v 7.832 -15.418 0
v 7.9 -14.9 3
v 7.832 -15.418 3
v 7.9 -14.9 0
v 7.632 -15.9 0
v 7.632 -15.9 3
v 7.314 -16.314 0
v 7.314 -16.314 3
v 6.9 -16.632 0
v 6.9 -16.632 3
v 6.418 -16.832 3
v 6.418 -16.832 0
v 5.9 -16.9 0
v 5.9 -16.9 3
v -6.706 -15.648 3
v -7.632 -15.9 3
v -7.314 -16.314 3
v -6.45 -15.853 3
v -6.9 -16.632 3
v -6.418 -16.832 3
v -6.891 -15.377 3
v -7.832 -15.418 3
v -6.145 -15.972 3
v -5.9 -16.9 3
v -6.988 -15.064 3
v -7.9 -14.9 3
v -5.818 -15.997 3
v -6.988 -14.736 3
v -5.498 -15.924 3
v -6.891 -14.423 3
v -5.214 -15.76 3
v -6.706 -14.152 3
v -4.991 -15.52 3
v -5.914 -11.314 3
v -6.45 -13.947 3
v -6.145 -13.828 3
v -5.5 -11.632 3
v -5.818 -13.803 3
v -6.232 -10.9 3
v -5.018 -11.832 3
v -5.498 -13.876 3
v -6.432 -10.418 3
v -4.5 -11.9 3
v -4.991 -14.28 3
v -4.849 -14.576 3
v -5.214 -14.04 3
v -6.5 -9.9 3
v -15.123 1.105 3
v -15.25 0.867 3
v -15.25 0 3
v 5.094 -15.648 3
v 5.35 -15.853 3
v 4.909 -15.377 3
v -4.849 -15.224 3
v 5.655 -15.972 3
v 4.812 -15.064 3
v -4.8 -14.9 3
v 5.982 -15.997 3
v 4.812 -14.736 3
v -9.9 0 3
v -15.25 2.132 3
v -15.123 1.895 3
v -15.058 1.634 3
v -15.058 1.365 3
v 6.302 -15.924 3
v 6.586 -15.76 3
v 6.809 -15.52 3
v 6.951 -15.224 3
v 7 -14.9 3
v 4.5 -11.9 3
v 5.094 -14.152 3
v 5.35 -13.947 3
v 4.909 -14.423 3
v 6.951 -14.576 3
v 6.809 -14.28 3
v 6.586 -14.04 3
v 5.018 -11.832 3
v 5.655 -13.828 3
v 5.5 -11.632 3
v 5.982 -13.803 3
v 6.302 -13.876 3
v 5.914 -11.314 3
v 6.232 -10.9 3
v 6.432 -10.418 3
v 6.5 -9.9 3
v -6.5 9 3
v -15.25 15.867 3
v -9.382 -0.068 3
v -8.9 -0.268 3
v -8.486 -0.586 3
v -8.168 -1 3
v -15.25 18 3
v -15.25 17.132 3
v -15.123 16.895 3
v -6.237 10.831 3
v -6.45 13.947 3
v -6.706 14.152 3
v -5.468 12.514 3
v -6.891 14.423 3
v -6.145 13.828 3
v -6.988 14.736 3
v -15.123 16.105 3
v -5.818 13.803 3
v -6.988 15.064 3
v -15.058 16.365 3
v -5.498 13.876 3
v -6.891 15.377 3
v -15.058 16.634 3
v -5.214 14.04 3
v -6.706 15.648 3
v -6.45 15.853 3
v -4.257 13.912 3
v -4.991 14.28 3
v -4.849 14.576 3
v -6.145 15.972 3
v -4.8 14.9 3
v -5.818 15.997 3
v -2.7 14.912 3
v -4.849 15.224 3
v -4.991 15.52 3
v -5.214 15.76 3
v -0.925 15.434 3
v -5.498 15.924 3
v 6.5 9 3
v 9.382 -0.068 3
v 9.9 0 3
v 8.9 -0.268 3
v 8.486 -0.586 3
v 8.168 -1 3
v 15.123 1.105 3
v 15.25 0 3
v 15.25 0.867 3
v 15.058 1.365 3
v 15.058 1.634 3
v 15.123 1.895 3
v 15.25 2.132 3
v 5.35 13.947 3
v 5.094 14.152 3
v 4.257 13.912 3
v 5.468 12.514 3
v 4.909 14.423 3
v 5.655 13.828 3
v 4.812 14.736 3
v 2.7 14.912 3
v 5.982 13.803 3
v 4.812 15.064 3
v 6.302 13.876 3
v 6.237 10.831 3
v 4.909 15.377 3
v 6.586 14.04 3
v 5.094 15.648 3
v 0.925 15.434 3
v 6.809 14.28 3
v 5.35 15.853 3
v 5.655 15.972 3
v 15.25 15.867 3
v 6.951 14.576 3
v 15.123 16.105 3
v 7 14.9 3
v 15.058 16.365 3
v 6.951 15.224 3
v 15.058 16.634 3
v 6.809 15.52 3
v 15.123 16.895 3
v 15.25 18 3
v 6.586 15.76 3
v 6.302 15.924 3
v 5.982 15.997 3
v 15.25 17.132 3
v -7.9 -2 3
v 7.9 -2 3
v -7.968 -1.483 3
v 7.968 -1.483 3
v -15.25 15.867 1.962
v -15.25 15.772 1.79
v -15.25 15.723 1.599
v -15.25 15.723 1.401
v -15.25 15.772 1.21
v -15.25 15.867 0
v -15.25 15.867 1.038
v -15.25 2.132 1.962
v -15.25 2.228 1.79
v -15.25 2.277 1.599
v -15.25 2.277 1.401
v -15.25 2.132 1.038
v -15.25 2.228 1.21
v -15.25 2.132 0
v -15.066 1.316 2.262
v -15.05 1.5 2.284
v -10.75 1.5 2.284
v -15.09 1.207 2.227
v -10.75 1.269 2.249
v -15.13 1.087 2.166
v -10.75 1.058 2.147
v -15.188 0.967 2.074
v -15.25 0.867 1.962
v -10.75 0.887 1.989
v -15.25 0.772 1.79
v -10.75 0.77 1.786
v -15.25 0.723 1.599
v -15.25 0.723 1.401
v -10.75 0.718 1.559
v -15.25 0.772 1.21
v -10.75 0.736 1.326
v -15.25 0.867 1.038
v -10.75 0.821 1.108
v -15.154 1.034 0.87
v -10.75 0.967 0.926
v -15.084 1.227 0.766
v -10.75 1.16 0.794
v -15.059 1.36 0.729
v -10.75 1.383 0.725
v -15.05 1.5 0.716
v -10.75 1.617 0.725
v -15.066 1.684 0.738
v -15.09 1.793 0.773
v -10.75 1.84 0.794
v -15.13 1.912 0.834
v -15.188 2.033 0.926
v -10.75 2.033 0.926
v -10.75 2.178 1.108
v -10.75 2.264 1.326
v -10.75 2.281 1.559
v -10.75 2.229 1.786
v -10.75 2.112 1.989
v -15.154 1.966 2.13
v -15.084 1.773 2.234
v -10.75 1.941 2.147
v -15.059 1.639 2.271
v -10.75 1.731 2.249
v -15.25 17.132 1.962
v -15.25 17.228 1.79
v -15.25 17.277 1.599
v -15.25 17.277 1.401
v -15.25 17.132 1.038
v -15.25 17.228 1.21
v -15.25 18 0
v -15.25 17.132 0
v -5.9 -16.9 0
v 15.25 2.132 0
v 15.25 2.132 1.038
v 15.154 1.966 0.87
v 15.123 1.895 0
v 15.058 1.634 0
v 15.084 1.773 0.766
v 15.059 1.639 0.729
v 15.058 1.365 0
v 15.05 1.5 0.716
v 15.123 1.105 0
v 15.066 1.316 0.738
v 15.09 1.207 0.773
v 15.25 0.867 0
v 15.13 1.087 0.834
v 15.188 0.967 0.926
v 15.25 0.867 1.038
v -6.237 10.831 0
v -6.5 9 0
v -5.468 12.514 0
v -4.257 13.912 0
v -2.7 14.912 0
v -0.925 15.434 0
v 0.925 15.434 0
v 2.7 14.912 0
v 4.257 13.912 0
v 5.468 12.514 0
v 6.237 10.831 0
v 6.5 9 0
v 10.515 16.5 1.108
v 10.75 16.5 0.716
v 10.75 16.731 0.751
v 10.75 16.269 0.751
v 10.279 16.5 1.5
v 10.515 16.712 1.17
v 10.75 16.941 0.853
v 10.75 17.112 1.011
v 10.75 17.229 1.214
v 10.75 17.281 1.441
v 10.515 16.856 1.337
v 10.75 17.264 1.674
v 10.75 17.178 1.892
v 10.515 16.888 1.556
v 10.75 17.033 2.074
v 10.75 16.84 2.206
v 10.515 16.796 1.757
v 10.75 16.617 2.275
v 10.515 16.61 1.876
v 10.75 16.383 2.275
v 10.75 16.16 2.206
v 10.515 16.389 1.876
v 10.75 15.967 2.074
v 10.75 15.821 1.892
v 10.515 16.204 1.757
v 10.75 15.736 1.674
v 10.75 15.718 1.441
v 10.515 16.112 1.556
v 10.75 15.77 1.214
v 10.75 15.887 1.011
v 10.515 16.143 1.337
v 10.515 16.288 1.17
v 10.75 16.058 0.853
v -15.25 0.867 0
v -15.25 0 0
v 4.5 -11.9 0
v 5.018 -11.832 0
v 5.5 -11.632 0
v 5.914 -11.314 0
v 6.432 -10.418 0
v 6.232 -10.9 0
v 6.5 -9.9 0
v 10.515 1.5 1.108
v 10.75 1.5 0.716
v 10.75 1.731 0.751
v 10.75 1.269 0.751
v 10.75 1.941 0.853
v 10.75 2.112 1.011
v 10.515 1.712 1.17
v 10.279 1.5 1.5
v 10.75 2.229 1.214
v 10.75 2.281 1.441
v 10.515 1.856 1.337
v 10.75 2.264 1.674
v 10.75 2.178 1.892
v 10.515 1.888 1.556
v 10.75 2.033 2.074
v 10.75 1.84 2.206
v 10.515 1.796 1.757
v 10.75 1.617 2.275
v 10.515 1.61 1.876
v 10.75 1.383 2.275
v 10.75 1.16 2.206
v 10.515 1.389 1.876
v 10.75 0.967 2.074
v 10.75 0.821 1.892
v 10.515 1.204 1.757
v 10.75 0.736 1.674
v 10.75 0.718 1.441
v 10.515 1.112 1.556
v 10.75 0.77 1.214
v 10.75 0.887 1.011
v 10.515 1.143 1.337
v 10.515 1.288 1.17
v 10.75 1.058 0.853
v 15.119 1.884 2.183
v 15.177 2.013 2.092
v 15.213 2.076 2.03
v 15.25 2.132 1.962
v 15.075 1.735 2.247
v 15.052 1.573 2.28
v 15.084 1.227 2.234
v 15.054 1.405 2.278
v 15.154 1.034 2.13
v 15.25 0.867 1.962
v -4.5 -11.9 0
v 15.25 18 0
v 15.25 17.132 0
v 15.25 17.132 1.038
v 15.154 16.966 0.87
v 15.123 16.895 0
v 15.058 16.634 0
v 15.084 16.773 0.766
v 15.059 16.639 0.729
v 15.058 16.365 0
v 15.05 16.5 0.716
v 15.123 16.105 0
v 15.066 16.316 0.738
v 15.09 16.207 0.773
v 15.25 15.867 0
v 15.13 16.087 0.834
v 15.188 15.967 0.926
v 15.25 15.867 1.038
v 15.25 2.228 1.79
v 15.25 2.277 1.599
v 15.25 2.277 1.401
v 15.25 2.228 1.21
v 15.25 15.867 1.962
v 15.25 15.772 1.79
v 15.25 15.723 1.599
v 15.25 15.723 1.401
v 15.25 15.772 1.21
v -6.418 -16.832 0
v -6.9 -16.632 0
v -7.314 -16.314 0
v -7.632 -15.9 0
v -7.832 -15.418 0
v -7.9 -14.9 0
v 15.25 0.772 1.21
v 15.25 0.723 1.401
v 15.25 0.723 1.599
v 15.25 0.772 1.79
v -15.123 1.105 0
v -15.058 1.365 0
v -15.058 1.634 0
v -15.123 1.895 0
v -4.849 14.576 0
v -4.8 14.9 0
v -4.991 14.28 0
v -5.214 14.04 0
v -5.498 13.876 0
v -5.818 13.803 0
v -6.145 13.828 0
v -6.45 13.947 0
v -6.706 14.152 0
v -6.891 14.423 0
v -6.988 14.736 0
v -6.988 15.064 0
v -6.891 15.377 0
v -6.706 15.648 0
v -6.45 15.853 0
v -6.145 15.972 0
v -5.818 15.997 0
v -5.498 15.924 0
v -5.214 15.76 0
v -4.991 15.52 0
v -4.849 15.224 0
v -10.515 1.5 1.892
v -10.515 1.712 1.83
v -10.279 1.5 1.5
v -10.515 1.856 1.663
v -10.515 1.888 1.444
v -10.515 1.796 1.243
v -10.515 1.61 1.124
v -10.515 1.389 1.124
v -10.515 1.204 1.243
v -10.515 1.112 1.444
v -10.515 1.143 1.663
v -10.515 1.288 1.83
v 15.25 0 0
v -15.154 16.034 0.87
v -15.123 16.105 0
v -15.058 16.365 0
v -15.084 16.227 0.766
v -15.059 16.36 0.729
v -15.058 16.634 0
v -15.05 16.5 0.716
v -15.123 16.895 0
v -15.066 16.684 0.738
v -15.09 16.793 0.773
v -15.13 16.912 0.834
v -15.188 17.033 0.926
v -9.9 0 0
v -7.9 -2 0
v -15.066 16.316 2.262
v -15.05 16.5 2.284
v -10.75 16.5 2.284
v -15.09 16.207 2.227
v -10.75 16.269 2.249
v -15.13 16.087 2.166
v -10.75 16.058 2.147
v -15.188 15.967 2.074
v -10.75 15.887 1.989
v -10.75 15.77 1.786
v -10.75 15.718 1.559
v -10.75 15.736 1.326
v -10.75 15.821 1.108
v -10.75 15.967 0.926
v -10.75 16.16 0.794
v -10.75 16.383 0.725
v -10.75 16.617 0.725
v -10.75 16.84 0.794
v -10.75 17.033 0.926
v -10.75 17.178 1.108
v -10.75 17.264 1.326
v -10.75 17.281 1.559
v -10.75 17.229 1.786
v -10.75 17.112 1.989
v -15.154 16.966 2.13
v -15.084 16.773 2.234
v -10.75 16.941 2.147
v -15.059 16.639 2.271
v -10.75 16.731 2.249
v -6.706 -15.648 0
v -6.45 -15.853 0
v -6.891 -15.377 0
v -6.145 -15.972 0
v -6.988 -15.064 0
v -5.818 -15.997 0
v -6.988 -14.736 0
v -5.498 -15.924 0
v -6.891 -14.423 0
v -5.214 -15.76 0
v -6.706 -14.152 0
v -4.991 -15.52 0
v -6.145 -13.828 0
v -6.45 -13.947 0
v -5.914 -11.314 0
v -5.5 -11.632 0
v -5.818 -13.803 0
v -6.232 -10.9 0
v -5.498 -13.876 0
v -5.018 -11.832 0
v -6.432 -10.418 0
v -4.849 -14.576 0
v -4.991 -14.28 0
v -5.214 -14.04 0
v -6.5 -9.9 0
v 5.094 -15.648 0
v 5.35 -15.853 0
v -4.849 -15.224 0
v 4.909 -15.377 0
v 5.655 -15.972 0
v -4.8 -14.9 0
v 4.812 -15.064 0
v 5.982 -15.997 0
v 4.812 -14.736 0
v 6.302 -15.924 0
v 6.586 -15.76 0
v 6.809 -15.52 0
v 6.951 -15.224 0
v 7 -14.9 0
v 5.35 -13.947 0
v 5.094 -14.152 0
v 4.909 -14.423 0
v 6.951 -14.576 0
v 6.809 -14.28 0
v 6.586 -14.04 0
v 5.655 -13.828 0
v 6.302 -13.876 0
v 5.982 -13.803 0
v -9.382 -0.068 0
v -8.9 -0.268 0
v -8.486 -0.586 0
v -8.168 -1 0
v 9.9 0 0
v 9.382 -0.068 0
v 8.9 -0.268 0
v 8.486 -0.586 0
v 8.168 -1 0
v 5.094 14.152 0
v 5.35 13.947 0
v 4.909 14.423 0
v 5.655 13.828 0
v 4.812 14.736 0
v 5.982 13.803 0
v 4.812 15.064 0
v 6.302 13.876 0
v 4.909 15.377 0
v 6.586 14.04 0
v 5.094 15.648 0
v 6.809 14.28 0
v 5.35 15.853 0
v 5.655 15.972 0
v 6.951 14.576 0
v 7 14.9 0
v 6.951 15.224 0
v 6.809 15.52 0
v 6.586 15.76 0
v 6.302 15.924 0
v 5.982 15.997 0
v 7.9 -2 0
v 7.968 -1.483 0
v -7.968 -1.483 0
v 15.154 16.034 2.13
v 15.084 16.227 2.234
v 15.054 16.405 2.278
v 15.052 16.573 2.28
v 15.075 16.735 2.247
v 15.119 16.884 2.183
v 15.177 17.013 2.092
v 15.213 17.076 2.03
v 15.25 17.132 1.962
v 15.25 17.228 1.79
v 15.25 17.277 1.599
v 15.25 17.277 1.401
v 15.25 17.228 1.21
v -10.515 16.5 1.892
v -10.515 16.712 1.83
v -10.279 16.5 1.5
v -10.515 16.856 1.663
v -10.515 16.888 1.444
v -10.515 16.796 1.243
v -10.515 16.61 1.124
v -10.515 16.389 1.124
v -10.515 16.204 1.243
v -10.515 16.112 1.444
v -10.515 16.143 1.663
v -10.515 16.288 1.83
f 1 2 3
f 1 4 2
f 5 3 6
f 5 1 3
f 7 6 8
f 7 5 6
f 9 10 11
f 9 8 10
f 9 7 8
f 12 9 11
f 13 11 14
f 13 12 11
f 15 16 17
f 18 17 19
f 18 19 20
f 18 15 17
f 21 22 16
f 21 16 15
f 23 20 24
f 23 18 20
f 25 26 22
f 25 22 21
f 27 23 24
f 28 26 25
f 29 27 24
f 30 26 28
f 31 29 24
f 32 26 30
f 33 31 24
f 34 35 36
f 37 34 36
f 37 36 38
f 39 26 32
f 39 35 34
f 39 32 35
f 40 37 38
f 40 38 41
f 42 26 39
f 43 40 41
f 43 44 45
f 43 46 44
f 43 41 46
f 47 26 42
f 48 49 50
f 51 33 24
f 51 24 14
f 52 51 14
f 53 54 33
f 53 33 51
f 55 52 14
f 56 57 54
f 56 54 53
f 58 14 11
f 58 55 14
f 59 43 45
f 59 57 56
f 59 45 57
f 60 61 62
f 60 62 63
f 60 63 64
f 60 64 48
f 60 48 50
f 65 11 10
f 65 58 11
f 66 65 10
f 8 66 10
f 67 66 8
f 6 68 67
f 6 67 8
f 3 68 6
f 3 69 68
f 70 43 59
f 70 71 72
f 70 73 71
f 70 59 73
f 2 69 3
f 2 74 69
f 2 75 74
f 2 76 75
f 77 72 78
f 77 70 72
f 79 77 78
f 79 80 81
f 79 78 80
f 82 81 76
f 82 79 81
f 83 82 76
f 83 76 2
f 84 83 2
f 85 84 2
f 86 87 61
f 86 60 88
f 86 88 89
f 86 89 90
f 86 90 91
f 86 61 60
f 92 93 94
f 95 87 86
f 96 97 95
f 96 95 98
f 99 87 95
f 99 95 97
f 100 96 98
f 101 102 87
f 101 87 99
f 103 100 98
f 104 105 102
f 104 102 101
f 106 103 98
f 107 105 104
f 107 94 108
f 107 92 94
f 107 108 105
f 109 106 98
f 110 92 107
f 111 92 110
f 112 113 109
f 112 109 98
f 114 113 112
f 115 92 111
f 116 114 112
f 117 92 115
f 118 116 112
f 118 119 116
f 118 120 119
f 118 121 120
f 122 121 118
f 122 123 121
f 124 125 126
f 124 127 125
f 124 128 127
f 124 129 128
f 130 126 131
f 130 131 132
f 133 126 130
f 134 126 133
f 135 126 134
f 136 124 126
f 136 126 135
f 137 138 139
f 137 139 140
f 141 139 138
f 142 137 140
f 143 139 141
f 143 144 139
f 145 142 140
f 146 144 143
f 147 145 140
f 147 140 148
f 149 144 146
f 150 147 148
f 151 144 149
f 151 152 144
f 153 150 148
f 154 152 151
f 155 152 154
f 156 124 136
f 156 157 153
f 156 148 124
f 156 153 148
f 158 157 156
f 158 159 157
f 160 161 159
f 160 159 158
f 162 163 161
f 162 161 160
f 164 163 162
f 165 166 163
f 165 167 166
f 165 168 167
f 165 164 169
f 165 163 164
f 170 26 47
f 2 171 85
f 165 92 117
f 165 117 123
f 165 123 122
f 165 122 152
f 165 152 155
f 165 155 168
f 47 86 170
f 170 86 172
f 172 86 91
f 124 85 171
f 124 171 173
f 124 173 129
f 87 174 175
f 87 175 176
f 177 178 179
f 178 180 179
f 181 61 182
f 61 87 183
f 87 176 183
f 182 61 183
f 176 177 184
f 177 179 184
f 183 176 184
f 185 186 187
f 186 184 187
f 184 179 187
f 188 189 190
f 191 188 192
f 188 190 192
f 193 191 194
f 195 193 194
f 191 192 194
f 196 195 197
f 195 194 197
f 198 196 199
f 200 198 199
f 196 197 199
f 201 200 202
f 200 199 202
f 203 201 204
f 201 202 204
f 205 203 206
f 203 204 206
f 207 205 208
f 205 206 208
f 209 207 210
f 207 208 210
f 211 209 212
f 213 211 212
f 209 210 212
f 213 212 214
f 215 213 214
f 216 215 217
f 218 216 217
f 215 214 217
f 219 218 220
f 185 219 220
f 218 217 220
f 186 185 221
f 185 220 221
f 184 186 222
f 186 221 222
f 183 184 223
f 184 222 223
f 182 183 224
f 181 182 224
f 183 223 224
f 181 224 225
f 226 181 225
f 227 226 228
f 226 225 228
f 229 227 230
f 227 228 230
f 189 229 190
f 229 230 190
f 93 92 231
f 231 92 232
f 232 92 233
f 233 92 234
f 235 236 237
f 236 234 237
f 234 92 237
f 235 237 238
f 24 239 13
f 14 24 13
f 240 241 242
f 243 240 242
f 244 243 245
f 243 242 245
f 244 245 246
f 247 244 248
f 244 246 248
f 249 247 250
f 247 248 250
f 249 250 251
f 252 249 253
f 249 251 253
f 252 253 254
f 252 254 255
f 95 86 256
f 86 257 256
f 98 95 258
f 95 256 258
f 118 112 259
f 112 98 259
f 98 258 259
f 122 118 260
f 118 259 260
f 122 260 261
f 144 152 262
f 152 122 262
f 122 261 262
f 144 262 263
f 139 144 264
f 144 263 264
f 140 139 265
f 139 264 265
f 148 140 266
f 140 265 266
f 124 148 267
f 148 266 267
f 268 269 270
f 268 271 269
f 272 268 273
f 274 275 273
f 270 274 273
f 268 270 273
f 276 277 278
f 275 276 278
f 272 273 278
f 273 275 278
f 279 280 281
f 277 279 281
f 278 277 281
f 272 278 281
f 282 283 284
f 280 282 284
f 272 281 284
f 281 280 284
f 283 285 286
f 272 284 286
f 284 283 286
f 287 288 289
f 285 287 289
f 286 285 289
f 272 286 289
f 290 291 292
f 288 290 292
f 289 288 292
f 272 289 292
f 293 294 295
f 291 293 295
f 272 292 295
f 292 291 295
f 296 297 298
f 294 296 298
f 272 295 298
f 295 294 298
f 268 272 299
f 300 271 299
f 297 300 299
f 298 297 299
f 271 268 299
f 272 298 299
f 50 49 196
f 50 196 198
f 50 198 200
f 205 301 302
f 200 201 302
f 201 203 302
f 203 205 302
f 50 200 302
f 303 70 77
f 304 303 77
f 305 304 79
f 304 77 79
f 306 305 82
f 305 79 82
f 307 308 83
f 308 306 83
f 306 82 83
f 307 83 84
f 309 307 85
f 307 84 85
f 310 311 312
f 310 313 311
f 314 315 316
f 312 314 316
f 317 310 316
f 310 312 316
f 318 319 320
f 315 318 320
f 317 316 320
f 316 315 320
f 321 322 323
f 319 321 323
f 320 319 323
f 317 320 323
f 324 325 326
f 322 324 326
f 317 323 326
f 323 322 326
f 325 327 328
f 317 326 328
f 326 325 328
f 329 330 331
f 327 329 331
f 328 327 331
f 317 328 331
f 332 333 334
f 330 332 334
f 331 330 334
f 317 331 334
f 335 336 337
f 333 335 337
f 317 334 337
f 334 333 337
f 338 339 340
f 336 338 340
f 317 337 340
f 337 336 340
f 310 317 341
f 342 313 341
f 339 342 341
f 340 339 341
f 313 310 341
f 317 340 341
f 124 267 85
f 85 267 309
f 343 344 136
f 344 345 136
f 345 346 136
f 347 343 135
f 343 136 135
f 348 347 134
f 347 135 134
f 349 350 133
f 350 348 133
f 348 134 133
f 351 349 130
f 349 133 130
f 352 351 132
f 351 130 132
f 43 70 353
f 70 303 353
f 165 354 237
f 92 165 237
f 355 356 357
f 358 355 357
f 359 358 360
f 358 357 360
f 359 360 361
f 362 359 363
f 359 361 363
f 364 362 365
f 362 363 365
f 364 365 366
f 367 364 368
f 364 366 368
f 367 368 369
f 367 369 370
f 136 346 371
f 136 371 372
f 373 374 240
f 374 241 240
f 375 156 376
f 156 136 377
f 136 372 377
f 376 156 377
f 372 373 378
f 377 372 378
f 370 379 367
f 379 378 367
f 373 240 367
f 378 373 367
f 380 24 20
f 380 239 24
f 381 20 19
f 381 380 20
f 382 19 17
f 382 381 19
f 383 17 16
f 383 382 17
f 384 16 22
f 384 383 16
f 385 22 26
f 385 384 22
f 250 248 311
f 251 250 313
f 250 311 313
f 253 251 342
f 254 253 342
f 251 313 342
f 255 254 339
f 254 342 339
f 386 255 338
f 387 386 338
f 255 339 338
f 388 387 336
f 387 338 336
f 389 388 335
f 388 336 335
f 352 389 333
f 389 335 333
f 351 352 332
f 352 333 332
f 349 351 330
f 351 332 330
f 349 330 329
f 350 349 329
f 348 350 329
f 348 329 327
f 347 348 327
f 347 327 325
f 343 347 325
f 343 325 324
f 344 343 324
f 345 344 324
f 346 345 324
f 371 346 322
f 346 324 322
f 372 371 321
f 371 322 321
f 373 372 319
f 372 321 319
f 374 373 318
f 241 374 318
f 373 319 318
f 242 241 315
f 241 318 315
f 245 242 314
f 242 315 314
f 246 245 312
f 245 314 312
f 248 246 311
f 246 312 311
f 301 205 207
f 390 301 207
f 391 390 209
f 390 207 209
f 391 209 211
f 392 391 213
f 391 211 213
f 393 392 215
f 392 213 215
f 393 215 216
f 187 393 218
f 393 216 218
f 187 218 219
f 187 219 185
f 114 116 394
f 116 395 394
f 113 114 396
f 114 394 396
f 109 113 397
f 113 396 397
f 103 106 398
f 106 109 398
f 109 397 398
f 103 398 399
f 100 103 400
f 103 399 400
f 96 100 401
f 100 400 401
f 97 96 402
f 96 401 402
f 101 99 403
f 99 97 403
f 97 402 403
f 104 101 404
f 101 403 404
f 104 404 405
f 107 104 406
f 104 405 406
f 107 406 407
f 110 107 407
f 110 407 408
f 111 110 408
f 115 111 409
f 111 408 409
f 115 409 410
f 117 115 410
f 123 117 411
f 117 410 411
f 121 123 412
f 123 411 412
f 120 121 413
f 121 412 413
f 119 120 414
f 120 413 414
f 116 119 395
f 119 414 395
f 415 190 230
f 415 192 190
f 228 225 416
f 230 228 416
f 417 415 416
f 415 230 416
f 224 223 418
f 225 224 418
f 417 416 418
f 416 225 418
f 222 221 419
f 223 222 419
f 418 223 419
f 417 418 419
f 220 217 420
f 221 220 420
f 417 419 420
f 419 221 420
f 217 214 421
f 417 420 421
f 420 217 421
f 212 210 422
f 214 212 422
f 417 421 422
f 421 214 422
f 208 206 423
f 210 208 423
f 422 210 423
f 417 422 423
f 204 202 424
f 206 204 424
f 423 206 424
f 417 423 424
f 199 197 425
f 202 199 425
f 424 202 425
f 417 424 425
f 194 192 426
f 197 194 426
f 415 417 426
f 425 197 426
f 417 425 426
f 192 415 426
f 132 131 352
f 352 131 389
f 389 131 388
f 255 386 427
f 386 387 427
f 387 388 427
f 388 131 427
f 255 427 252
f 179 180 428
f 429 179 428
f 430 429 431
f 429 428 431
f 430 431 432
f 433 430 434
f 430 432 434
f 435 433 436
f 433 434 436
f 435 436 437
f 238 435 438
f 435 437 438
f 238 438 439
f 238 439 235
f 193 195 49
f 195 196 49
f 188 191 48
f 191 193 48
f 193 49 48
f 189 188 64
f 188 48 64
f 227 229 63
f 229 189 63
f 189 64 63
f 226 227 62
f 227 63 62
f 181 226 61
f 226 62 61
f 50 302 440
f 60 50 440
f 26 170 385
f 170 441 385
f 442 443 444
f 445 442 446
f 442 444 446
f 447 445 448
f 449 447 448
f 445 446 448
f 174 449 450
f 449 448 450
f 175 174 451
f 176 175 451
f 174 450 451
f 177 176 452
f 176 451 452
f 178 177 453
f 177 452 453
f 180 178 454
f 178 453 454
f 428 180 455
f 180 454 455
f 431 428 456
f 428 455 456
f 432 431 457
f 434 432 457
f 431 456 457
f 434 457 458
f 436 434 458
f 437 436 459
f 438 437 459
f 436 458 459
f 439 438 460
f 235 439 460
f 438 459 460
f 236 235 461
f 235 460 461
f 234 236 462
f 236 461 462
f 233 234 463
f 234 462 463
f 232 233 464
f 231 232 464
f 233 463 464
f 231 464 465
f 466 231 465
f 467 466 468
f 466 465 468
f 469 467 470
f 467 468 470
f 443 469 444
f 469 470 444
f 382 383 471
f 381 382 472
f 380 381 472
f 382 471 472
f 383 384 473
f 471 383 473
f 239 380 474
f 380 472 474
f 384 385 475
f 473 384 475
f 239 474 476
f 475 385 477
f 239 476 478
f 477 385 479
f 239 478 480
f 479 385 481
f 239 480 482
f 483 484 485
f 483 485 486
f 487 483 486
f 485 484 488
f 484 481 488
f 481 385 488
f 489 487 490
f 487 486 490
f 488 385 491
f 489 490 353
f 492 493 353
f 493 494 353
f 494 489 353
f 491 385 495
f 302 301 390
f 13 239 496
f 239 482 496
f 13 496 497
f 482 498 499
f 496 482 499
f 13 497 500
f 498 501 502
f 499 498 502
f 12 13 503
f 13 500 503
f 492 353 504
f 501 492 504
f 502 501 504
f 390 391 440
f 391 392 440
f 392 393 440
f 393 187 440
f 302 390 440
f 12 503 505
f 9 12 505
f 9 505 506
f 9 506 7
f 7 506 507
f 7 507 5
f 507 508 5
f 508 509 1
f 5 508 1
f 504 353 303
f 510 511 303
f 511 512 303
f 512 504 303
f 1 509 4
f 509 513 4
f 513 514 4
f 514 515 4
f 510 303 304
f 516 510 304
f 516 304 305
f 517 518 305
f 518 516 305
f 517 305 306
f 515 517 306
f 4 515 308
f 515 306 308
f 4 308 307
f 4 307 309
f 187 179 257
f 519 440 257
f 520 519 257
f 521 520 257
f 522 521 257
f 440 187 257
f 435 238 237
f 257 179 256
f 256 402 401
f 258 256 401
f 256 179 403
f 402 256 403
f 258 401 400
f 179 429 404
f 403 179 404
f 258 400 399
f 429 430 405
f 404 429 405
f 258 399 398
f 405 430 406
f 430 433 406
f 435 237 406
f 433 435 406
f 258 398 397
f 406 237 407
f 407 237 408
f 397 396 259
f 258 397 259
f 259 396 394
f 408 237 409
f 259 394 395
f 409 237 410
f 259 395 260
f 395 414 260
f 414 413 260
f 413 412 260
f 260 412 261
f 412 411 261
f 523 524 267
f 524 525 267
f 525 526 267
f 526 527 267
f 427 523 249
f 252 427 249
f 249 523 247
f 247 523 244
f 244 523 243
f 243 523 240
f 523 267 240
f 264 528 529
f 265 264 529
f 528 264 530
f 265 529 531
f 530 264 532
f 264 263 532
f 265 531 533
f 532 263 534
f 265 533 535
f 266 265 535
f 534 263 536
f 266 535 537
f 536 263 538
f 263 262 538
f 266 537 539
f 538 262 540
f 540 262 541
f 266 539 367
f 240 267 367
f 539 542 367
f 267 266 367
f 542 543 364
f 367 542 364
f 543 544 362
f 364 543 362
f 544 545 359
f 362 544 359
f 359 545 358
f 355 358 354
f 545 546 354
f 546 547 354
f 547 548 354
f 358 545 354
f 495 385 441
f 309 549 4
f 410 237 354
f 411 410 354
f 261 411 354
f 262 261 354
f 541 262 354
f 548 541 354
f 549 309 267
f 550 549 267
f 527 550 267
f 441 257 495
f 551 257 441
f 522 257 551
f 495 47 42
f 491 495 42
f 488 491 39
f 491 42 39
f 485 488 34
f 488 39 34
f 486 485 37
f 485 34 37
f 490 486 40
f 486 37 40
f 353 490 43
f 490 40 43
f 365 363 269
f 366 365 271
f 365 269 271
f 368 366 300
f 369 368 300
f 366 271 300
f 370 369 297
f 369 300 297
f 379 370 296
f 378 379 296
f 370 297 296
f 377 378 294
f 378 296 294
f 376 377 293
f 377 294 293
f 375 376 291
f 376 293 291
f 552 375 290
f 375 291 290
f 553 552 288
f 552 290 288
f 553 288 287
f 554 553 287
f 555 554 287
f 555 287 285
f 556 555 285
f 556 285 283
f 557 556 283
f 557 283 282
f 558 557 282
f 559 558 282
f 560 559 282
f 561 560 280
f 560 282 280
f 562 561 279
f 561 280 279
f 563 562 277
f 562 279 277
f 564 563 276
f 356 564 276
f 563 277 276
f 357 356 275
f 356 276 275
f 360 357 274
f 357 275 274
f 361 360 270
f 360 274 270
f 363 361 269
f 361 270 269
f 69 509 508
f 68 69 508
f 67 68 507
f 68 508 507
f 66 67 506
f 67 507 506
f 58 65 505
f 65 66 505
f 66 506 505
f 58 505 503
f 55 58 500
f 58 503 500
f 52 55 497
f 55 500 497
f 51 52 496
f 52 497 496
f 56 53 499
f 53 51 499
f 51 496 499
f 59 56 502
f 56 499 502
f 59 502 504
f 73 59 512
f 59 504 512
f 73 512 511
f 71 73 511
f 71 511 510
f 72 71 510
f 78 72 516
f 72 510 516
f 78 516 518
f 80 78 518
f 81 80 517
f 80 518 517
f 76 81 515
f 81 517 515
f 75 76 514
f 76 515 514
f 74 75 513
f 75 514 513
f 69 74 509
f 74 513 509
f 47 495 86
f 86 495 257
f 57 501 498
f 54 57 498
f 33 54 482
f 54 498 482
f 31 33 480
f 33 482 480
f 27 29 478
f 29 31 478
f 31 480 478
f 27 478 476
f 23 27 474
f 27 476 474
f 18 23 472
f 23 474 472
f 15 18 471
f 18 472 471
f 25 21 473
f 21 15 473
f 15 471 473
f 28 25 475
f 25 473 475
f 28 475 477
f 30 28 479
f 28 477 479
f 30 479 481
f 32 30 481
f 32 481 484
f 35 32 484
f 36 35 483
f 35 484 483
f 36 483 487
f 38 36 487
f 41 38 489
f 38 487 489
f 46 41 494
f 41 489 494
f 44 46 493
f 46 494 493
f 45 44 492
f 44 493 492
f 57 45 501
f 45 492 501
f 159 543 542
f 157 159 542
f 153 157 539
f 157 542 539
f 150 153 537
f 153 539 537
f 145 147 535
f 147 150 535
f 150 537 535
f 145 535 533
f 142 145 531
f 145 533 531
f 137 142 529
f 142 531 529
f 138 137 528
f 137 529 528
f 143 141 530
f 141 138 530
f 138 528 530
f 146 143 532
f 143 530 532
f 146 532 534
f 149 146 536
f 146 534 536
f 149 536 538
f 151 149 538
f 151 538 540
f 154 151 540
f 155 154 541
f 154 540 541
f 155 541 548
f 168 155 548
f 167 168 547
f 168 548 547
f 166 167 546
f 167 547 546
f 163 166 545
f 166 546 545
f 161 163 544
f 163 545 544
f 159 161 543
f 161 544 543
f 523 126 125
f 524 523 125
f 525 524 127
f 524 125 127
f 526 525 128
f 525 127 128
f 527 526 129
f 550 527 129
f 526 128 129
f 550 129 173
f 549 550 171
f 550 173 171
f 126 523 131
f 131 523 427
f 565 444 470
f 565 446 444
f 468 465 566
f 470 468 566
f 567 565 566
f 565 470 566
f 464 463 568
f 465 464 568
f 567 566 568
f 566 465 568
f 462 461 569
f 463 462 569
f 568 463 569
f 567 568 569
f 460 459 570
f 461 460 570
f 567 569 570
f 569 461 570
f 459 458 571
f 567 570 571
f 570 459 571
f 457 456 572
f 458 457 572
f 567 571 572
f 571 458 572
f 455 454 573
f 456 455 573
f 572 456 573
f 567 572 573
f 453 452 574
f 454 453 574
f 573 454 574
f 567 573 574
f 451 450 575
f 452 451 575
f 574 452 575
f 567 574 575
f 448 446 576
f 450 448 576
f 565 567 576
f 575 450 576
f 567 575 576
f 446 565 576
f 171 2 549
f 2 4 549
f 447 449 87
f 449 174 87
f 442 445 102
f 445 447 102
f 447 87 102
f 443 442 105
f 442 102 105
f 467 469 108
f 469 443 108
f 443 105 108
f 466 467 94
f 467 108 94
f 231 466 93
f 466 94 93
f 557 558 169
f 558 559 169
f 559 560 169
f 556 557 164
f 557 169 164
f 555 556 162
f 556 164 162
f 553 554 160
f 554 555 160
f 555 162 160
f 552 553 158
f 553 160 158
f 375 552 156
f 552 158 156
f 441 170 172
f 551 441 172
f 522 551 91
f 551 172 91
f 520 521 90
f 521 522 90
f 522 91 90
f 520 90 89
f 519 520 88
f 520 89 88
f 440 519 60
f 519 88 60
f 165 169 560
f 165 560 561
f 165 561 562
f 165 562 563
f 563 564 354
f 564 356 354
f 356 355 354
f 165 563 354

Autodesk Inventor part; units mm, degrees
ref_plane "YZ Plane" through (0, 0, 0) normal (1, 0, 0) x (0, 1, 0)
ref_plane "XZ Plane" through (0, 0, 0) normal (0, 1, 0) x (-1, 0, 0)
ref_plane "XY Plane" through (0, 0, 0) normal (0, 0, 1) x (1, 0, 0)
sketch "スケッチ1" plane through (0, 0, 0) normal (0, 0, 1) x (1, 0, 0)
  line L0 (-5.9, -14.9) -> (5.9, -14.9) construction
  line L1 (5.9, -14.9) -> (5.9, 14.9) construction
  line L2 (5.9, 14.9) -> (-5.9, 14.9) construction
  line L3 (-5.9, 14.9) -> (-5.9, -14.9) construction
  line L4 (-5.9, -14.9) -> (5.9, 14.9) construction
  line L5 (5.9, -14.9) -> (-5.9, 14.9) construction
  circle A0 centre (-5.9, 14.9) radius 1.1
  circle A1 centre (-5.9, 14.9) radius 2
  circle A2 centre (5.9, 14.9) radius 2
  circle A3 centre (5.9, 14.9) radius 1.1
  circle A4 centre (-5.9, -14.9) radius 2
  circle A5 centre (-5.9, -14.9) radius 1.1
  circle A6 centre (5.9, -14.9) radius 2
  circle A7 centre (5.9, -14.9) radius 1.1
  circle A8 centre (0, 8.9998) radius 6.5
  circle A9 centre (-5.9, 14.9) radius 8.344 construction
  line L6 (-6.5, 8.9998) -> (6.5, 8.9998)
  line L7 (6.5, 8.9998) -> (6.5, -11.9)
  line L8 (6.5, -11.9) -> (-6.5, -11.9)
  line L9 (-6.5, -11.9) -> (-6.5, 8.9998)
  line L10 (-7.9, -16.9) -> (7.9, -16.9)
  line L11 (7.9, -16.9) -> (7.9, 16.9)
  line L12 (7.9, 16.9) -> (-7.9, 16.9)
  line L13 (-7.9, 16.9) -> (-7.9, -16.9)
  line L14 (-7.9, -16.9) -> (7.9, 16.9) construction
  line L15 (7.9, -16.9) -> (-7.9, 16.9) construction
  line L16 (-15.25, -0.0002) -> (15.25, -0.0002)
  line L17 (15.25, -0.0002) -> (15.25, 17.9998)
  line L18 (15.25, 17.9998) -> (-15.25, 17.9998)
  line L19 (-15.25, 17.9998) -> (-15.25, -0.0002)
  line L20 (-15.25, -0.0002) -> (15.25, 17.9998) construction
  line L21 (15.25, -0.0002) -> (-15.25, 17.9998) construction
  point P0 (0, 0)
  point P1 (0, 14.9)
  point P2 (7.9, -0.0002)
  point P3 (-7.9, -0.0002)
  point P4 (-7.9, -14.9)
  point P5 (-5.9, -16.9)
  point P6 (5.9, -16.9)
  point P7 (7.9, -14.9)
  point P8 (6.5, 8.9998)
  dimension "d12" = 13
  dimension "d13" = 16.688
  dimension "d0" = 11.8
  dimension "d1" = 29.8
  dimension "d2" = 2.2
  dimension "d3" = 4
  dimension "d6" = 11.8
  dimension "d9" = 29.8
  dimension "d14" = 3
  dimension "d15" = 30.5
  dimension "d16" = 18
extrude "押し出し1" add sketch "スケッチ1" along normal blind 3 contours A1 A8 | A1 L12 A2 A8 | L12 L13 L16 L19 L18 L17 L11 | A1 L13 L12 | A1 A8 L9 L16 L13 | L12 L11 A2 | A2 A8 | L16 L9 L8 L7 L11 A6 L10 A4 L13 | L11 L16 L7 A8 A2 | A4 | A6 picked at (-7.5833, 15.0483) picked at (7.5833, 15.0483)
fillet "フィレット1" radius 2 4 edges at (-7.9, -0.0002, 1.5) (7.9, -0.0002, 1.5) (-6.5, -11.9, 1.5) (6.5, -11.9, 1.5)
sketch "スケッチ2" plane through (-15.25, -0.0002, 0) normal (-1, 0, 0) x (0, 0, 1)
  line L0 (0, 18) -> (3, 18) construction
  line L1 (1.5, 18) -> (1.5, 0) construction
  line L2 (0, 0) -> (3, 0) construction
  line L3 (0, 9) -> (3, 9) construction
  line L4 (1.5, 9) -> (3, 9) construction
  point P0 (0, 0.0002)
  point P1 (1.5, 16.5)
  point P2 (1.5, 1.5)
  dimension "d20" = 15
hole "穴1" at (-15.25, 16.4998, 1.5) at (-15.25, 1.4998, 1.5) direction (1, 0, 0) diameter 1.567 depth 4.5 tip angle 118 thread size "M2x0.4" class "6H" standard "ISO Metric profile"
sketch "スケッチ3" plane through (15.25, -0.0002, 0) normal (1, 0, 0) x (0, 0, -1)
  line L0 (0, 0) -> (0, 18) projected
  circle A0 centre (-1.5, 1.5) radius 0.7835 projected
  circle A1 centre (-1.5, 16.5) radius 0.7835 projected
  line L1 (0, 18) -> (0, 0) projected
  line L2 (0, 0) -> (-3, 0) projected
  line L3 (-3, 18) -> (-3, 0) projected
  line L4 (0, 18) -> (-3, 18) projected
  point P0 (0, 0.0002)
hole "穴2" at (15.25, 1.4998, 1.5) at (15.25, 16.4998, 1.5) direction (-1, 0, 0) diameter 1.567 depth 4.5 tip angle 118 thread size "M2x0.4" class "6H" standard "ISO Metric profile"
sketch "スケッチ4" plane through (0, 0, 3) normal (0, 0, 1) x (1, 0, 0)
  line L0 (-15.25, 0.7163) -> (-15.25, 2.2833) projected
  line L1 (-15.25, 15.7163) -> (-15.25, 17.2833) projected
  circle A0 centre (-16.15, 1.4998) radius 1.1
  line L2 (-15.25, 17.9998) -> (-15.25, -0.0002) construction
  line L3 (-15.25, 8.9998) -> (15.25, 8.9998) construction
  line L4 (15.25, -0.0002) -> (15.25, 17.9998) construction
  line L5 (15.25, 17.9998) -> (-15.25, 17.9998) construction
  line L6 (0, 17.9998) -> (0, 8.9998) construction
  circle A1 centre (-16.15, 16.4998) radius 1.1
  line L7 (15.25, 0.7163) -> (15.25, 2.2833)
  line L8 (15.25, 15.7163) -> (15.25, 17.2833)
  circle A2 centre (16.15, 1.4998) radius 1.1
  line L9 (15.25, 17.9998) -> (15.25, -0.0002) construction
  circle A3 centre (16.15, 16.4998) radius 1.1
  point P0 (0, 0)
  point P1 (-15.25, 1.4998)
  point P2 (15.25, 1.4998)
  dimension "d35" = 2.2
  dimension "d36" = 0.9
extrude "押し出し2" cut sketch "スケッチ4" against normal blind 3
equation "\"d6\" = d0"
equation "\"d9\" = d1"
properties part number "udeyo"
